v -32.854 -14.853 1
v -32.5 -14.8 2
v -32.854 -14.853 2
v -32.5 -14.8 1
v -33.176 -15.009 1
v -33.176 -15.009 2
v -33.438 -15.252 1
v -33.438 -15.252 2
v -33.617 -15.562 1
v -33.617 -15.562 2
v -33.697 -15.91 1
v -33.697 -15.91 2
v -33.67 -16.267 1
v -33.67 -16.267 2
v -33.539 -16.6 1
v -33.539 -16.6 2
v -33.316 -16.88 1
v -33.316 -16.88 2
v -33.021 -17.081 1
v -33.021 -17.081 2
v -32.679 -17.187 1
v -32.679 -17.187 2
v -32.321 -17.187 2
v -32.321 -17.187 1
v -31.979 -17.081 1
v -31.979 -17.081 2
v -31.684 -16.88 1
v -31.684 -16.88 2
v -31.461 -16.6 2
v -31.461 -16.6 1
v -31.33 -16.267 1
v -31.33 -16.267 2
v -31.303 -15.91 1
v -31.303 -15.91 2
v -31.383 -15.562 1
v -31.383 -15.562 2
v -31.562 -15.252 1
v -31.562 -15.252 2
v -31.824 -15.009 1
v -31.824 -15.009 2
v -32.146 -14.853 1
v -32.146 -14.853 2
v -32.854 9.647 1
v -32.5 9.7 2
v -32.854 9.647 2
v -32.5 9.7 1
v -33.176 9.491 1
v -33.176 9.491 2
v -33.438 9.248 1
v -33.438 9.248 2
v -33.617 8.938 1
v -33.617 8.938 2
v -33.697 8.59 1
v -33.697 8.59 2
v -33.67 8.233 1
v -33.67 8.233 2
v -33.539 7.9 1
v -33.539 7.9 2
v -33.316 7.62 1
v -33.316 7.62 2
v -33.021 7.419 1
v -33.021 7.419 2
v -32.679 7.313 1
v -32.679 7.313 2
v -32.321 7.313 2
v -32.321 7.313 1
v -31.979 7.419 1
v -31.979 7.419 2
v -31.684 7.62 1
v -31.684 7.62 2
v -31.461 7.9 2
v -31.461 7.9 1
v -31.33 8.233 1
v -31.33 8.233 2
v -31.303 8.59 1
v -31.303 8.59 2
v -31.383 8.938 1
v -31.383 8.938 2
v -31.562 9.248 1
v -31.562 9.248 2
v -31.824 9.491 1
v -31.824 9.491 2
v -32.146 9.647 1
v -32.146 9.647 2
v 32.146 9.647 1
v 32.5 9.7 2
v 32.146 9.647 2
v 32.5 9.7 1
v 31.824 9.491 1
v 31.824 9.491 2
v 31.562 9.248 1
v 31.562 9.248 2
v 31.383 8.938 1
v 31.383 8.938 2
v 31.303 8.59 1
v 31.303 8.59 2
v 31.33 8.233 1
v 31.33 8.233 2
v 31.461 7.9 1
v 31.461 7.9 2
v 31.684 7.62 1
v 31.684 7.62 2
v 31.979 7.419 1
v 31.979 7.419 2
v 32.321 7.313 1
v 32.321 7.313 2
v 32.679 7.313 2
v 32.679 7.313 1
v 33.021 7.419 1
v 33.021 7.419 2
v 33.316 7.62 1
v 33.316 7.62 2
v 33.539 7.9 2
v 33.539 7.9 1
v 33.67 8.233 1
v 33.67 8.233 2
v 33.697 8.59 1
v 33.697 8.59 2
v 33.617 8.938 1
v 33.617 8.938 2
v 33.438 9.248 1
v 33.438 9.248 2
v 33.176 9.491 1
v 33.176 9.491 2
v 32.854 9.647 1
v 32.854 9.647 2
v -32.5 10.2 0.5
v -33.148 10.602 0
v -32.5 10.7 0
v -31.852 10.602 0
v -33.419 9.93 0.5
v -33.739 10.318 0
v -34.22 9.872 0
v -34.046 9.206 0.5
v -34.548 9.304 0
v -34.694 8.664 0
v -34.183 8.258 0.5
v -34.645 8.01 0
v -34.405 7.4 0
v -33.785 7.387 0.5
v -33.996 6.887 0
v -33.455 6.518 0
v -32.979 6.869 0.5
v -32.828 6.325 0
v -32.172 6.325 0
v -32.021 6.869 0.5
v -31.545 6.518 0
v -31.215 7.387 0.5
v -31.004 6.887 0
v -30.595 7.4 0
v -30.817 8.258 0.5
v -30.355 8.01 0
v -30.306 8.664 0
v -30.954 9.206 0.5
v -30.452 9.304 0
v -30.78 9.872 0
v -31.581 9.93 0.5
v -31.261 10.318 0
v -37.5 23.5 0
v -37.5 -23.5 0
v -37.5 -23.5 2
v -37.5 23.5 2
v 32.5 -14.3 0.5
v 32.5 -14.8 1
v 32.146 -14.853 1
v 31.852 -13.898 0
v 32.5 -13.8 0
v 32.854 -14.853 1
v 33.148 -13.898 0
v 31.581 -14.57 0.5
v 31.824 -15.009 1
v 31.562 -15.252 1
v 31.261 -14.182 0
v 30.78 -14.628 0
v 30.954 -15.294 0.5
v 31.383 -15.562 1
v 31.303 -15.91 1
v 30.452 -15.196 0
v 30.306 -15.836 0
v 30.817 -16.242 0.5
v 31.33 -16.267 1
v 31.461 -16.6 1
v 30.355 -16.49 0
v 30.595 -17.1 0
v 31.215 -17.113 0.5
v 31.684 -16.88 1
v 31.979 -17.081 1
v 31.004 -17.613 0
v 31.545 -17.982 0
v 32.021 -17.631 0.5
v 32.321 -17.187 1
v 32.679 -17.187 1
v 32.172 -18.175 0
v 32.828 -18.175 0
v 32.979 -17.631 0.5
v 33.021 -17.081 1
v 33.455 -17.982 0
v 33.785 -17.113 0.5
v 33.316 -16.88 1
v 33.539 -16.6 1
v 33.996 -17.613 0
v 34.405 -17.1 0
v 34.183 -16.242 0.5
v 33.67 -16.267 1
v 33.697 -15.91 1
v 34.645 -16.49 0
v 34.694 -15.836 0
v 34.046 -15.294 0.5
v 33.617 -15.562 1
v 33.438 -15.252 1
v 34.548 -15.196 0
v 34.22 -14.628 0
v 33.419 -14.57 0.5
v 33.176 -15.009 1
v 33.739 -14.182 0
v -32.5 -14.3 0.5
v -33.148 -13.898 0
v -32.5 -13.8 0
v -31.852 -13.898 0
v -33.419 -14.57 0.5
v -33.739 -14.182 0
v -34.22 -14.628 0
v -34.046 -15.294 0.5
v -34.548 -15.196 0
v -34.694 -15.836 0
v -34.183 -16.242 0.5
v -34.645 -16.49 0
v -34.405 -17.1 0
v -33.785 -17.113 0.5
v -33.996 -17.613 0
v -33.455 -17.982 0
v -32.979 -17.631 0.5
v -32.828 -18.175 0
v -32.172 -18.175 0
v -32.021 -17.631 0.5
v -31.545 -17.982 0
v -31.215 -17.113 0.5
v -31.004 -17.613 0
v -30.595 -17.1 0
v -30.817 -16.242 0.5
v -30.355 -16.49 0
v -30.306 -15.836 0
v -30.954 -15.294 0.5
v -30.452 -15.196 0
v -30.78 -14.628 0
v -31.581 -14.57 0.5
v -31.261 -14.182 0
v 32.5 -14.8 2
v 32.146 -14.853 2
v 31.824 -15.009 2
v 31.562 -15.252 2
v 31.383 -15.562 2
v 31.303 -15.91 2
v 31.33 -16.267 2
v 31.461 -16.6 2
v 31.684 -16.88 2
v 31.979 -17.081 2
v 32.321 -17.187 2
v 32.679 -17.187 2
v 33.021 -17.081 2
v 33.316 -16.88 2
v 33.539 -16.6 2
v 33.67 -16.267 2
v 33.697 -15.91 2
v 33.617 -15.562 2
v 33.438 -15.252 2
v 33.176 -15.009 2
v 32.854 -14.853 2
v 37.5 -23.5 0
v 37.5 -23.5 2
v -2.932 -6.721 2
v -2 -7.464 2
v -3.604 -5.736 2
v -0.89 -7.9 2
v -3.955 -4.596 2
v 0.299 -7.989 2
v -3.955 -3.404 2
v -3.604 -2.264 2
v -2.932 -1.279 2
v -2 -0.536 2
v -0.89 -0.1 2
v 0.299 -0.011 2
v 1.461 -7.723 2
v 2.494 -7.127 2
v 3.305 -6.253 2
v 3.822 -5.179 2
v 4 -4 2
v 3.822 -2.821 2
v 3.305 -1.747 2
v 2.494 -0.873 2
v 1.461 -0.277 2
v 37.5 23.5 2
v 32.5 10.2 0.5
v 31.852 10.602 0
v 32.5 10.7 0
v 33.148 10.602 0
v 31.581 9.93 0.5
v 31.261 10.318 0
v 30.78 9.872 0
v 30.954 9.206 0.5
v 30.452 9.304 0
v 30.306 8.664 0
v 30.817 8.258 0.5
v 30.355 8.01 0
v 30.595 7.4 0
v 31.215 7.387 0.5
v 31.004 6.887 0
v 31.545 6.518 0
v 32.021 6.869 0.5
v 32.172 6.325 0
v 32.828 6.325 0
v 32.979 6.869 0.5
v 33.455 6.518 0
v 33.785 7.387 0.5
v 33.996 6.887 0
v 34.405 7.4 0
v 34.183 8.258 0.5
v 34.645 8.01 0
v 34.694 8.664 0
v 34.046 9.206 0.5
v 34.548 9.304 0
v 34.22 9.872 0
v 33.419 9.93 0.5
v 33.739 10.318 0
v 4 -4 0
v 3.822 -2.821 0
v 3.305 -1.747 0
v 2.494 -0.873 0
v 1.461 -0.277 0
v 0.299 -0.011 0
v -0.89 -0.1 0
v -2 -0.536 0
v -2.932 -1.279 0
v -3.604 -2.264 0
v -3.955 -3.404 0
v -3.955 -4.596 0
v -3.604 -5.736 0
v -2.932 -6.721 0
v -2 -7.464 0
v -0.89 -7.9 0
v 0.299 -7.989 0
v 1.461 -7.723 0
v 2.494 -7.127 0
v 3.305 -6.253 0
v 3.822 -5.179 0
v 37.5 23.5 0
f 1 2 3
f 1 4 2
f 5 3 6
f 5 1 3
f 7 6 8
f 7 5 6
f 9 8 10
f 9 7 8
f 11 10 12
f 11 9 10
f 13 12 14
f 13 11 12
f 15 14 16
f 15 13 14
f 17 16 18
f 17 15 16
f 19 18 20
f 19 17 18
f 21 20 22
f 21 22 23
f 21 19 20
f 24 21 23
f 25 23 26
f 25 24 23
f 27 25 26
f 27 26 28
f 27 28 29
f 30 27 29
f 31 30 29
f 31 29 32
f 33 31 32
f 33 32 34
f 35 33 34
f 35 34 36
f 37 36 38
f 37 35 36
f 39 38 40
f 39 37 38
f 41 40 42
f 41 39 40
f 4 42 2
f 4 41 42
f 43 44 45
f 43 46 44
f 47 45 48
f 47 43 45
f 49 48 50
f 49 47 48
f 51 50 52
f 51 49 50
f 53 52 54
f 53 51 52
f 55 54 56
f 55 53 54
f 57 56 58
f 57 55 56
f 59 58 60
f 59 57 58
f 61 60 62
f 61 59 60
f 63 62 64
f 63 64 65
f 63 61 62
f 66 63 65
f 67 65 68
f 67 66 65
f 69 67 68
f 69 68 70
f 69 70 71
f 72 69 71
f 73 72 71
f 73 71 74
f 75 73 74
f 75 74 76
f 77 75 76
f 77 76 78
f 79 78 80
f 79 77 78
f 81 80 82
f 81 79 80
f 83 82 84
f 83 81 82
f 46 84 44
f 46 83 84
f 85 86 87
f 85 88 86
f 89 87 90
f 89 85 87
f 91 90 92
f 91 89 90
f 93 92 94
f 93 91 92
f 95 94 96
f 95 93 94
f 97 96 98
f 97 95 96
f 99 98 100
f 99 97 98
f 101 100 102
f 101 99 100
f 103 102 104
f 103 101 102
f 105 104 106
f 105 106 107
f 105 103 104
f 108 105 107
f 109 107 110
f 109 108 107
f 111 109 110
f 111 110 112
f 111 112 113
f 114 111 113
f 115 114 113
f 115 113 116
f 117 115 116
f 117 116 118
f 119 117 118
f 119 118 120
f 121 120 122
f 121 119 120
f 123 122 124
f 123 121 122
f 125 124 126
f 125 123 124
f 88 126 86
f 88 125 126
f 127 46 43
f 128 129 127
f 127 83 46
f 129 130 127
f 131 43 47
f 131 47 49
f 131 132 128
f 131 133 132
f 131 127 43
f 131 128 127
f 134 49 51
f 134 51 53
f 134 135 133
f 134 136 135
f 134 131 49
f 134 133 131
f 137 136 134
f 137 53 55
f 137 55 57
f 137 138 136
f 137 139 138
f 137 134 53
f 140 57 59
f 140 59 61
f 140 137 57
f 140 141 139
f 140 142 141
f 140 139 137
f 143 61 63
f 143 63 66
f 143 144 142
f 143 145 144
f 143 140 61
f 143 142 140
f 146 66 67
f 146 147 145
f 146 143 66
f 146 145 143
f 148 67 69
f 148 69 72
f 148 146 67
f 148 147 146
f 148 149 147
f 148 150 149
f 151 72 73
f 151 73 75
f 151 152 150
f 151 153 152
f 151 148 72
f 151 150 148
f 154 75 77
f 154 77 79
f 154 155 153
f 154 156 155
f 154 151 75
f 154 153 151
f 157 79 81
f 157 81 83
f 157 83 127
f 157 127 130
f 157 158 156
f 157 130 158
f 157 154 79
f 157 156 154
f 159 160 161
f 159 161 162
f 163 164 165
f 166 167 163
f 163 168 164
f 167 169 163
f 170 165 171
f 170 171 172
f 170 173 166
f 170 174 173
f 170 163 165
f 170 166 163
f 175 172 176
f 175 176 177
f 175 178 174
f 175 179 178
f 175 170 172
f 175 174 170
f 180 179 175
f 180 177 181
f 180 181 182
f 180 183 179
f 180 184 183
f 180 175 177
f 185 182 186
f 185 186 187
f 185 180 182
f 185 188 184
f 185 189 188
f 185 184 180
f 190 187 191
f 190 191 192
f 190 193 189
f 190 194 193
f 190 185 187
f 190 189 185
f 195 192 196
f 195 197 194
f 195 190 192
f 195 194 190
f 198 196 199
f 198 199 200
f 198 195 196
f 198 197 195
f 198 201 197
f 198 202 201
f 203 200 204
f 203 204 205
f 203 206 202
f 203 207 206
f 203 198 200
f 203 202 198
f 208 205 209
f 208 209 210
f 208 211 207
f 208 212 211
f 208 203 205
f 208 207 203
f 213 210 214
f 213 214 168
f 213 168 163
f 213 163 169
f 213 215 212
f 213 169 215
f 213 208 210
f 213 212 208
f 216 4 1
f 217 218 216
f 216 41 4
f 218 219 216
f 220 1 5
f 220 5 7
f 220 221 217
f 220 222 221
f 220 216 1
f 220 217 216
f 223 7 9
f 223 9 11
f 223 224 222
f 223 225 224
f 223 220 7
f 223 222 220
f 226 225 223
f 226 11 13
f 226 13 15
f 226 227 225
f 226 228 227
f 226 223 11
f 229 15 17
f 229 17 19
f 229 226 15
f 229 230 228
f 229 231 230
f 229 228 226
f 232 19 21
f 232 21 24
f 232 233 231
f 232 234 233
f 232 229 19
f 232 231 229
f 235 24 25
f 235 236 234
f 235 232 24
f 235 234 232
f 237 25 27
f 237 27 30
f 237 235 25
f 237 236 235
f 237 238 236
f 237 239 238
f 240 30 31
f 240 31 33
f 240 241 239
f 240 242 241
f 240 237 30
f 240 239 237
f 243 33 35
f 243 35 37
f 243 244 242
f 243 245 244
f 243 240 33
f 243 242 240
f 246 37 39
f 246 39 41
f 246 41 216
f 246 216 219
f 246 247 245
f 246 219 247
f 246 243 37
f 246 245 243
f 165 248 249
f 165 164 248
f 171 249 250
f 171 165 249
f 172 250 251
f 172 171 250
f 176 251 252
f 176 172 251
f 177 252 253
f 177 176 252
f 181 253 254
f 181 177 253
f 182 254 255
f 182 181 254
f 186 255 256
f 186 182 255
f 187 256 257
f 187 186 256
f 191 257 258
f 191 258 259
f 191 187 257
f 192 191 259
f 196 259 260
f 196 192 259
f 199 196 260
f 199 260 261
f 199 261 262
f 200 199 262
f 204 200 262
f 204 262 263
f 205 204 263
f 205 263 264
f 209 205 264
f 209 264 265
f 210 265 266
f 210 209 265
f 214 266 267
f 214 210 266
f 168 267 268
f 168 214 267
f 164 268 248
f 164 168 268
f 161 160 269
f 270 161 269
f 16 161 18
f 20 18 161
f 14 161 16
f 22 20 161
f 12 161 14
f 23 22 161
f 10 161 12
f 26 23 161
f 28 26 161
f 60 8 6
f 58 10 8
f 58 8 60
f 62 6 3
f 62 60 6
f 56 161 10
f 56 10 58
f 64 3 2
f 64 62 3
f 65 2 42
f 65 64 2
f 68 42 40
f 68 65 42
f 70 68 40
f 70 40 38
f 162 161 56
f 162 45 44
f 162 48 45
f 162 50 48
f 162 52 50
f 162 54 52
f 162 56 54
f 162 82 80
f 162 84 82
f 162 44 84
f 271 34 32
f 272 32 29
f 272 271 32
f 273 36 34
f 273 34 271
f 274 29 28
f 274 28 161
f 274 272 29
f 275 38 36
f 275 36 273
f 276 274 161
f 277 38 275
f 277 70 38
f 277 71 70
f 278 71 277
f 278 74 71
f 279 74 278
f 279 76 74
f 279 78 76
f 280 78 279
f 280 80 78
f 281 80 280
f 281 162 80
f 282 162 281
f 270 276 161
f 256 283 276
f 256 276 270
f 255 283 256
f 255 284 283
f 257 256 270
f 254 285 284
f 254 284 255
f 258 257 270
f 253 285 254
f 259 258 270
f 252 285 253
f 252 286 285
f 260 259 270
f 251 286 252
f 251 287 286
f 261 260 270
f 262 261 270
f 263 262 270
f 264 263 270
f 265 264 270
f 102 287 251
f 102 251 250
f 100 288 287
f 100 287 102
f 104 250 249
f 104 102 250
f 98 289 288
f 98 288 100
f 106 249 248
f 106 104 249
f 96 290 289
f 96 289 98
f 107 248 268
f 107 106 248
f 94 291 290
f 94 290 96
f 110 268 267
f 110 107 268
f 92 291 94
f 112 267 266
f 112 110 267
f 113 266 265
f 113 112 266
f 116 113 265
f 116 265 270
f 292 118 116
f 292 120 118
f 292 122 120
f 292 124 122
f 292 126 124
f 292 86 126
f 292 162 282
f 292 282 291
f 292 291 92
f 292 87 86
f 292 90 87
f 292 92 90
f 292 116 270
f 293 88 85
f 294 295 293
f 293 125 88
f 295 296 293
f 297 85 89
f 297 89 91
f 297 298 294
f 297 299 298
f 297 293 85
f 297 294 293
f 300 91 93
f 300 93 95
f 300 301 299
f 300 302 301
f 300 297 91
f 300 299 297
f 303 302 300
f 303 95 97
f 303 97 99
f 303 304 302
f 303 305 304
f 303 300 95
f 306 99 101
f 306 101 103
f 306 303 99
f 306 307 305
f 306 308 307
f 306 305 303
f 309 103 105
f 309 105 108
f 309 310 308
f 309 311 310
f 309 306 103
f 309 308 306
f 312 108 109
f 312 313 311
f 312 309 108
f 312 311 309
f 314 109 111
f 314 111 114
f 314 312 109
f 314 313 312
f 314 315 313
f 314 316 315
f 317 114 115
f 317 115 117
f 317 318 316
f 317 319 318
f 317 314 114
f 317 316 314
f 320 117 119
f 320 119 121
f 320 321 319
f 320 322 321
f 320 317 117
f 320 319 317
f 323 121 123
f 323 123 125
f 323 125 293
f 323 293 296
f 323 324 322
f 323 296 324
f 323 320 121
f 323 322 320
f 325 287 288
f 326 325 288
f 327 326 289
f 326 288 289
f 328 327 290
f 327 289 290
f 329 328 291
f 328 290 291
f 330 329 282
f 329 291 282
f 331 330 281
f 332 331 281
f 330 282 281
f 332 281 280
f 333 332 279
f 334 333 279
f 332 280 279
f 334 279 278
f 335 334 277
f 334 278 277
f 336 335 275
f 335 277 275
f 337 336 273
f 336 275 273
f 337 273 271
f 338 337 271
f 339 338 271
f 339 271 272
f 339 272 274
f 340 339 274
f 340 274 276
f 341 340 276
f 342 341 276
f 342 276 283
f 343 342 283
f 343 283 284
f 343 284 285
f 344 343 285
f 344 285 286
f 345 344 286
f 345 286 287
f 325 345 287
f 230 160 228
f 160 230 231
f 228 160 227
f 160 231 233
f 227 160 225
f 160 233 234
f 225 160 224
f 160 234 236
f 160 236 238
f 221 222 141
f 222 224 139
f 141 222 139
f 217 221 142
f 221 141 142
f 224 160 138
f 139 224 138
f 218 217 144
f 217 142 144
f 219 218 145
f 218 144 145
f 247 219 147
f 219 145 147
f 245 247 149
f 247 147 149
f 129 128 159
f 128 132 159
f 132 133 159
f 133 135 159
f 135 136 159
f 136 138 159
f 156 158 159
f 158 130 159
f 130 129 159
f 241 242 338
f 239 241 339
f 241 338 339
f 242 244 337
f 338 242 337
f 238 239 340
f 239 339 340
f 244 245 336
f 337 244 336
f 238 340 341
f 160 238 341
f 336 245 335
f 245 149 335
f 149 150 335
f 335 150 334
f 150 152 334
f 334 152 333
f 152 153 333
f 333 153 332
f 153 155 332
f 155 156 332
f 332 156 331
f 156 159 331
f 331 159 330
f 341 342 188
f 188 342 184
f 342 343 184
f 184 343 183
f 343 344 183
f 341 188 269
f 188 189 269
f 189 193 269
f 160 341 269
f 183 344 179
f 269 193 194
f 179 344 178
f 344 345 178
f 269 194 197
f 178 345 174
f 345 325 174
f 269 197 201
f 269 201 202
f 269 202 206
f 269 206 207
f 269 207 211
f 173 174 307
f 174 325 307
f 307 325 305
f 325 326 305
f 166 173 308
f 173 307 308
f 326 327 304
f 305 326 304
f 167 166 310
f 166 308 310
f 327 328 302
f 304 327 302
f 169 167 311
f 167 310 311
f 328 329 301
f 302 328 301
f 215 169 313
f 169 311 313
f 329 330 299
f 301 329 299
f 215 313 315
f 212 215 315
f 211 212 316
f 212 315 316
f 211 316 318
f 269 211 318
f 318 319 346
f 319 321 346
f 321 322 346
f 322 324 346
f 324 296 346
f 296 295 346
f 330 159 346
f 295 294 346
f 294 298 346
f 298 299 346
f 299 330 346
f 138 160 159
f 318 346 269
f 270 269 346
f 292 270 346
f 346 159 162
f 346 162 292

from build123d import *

# Parameters (mm, degrees)
SKETCH1_W                                    = 75
SKETCH1_H                                    = 47
BOSS_EXTRUDE1_DEPTH                          = 2
SKETCH3_R                                    = 4
CUT_EXTRUDE1_DEPTH                           = 5
CSK_FOR_M2_COUNTERSUNK_FLAT_HEAD_SCR_2_COUNT = 2
CSK_FOR_M2_COUNTERSUNK_FLAT_HEAD_SCR_2_PITCH = 24.5
CSK_FOR_M2_COUNTERSUNK_FLAT_HEAD_SCR_3_COUNT = 2
CSK_FOR_M2_COUNTERSUNK_FLAT_HEAD_SCR_3_PITCH = 65
CSK_FOR_M2_COUNTERSUNK_FLAT_HEAD_SCR_4_COUNT = 2
CSK_FOR_M2_COUNTERSUNK_FLAT_HEAD_SCR_4_PITCH = 69.464019463


with BuildPart() as part:
    # Sketch1 → Boss-Extrude1 (new body)
    with BuildSketch(Plane.XY):
        Rectangle(SKETCH1_W, SKETCH1_H)
    extrude(amount=BOSS_EXTRUDE1_DEPTH)

    # Sketch3 → Cut-Extrude1 (cut)
    with BuildSketch(Plane.XY.offset(2)):
        with Locations((0, -4)):
            Circle(SKETCH3_R)
    extrude(amount=-CUT_EXTRUDE1_DEPTH, mode=Mode.SUBTRACT)

    # Sketch5 → CSK for M2 Countersunk Flat Head Screw1 (revolve, cut)
    with BuildSketch(Plane(origin=(32.5, 8.5, 0), x_dir=(0, 1, 0), z_dir=(1, 0, 0))):
        Polygon((0, 0), (0, 2), (1.2, 2), (1.2, 1), (2.2, 0), align=None)
    csk_for_m2_countersunk_flat_head_screw1 = revolve(axis=Axis((32.5, 8.5, -6.35), (0, 0, 1)), mode=Mode.SUBTRACT)

    # CSK for M2 Countersunk Flat Head Scr 2: CSK for M2 Countersunk Flat Head Screw1 ×2
    with Locations(*[(0, -i * CSK_FOR_M2_COUNTERSUNK_FLAT_HEAD_SCR_2_PITCH, 0) for i in range(1, CSK_FOR_M2_COUNTERSUNK_FLAT_HEAD_SCR_2_COUNT)]):
        add(csk_for_m2_countersunk_flat_head_screw1, mode=Mode.SUBTRACT)

    # CSK for M2 Countersunk Flat Head Scr 3: CSK for M2 Countersunk Flat Head Screw1 ×2
    with Locations(*[(-i * CSK_FOR_M2_COUNTERSUNK_FLAT_HEAD_SCR_3_PITCH, 0, 0) for i in range(1, CSK_FOR_M2_COUNTERSUNK_FLAT_HEAD_SCR_3_COUNT)]):
        add(csk_for_m2_countersunk_flat_head_screw1, mode=Mode.SUBTRACT)

    # CSK for M2 Countersunk Flat Head Scr 4: CSK for M2 Countersunk Flat Head Screw1 ×2
    with Locations(*[Vector(-0.935736234, -0.352700581, 0) * (i * CSK_FOR_M2_COUNTERSUNK_FLAT_HEAD_SCR_4_PITCH) for i in range(1, CSK_FOR_M2_COUNTERSUNK_FLAT_HEAD_SCR_4_COUNT)]):
        add(csk_for_m2_countersunk_flat_head_screw1, mode=Mode.SUBTRACT)


solid = part.part
